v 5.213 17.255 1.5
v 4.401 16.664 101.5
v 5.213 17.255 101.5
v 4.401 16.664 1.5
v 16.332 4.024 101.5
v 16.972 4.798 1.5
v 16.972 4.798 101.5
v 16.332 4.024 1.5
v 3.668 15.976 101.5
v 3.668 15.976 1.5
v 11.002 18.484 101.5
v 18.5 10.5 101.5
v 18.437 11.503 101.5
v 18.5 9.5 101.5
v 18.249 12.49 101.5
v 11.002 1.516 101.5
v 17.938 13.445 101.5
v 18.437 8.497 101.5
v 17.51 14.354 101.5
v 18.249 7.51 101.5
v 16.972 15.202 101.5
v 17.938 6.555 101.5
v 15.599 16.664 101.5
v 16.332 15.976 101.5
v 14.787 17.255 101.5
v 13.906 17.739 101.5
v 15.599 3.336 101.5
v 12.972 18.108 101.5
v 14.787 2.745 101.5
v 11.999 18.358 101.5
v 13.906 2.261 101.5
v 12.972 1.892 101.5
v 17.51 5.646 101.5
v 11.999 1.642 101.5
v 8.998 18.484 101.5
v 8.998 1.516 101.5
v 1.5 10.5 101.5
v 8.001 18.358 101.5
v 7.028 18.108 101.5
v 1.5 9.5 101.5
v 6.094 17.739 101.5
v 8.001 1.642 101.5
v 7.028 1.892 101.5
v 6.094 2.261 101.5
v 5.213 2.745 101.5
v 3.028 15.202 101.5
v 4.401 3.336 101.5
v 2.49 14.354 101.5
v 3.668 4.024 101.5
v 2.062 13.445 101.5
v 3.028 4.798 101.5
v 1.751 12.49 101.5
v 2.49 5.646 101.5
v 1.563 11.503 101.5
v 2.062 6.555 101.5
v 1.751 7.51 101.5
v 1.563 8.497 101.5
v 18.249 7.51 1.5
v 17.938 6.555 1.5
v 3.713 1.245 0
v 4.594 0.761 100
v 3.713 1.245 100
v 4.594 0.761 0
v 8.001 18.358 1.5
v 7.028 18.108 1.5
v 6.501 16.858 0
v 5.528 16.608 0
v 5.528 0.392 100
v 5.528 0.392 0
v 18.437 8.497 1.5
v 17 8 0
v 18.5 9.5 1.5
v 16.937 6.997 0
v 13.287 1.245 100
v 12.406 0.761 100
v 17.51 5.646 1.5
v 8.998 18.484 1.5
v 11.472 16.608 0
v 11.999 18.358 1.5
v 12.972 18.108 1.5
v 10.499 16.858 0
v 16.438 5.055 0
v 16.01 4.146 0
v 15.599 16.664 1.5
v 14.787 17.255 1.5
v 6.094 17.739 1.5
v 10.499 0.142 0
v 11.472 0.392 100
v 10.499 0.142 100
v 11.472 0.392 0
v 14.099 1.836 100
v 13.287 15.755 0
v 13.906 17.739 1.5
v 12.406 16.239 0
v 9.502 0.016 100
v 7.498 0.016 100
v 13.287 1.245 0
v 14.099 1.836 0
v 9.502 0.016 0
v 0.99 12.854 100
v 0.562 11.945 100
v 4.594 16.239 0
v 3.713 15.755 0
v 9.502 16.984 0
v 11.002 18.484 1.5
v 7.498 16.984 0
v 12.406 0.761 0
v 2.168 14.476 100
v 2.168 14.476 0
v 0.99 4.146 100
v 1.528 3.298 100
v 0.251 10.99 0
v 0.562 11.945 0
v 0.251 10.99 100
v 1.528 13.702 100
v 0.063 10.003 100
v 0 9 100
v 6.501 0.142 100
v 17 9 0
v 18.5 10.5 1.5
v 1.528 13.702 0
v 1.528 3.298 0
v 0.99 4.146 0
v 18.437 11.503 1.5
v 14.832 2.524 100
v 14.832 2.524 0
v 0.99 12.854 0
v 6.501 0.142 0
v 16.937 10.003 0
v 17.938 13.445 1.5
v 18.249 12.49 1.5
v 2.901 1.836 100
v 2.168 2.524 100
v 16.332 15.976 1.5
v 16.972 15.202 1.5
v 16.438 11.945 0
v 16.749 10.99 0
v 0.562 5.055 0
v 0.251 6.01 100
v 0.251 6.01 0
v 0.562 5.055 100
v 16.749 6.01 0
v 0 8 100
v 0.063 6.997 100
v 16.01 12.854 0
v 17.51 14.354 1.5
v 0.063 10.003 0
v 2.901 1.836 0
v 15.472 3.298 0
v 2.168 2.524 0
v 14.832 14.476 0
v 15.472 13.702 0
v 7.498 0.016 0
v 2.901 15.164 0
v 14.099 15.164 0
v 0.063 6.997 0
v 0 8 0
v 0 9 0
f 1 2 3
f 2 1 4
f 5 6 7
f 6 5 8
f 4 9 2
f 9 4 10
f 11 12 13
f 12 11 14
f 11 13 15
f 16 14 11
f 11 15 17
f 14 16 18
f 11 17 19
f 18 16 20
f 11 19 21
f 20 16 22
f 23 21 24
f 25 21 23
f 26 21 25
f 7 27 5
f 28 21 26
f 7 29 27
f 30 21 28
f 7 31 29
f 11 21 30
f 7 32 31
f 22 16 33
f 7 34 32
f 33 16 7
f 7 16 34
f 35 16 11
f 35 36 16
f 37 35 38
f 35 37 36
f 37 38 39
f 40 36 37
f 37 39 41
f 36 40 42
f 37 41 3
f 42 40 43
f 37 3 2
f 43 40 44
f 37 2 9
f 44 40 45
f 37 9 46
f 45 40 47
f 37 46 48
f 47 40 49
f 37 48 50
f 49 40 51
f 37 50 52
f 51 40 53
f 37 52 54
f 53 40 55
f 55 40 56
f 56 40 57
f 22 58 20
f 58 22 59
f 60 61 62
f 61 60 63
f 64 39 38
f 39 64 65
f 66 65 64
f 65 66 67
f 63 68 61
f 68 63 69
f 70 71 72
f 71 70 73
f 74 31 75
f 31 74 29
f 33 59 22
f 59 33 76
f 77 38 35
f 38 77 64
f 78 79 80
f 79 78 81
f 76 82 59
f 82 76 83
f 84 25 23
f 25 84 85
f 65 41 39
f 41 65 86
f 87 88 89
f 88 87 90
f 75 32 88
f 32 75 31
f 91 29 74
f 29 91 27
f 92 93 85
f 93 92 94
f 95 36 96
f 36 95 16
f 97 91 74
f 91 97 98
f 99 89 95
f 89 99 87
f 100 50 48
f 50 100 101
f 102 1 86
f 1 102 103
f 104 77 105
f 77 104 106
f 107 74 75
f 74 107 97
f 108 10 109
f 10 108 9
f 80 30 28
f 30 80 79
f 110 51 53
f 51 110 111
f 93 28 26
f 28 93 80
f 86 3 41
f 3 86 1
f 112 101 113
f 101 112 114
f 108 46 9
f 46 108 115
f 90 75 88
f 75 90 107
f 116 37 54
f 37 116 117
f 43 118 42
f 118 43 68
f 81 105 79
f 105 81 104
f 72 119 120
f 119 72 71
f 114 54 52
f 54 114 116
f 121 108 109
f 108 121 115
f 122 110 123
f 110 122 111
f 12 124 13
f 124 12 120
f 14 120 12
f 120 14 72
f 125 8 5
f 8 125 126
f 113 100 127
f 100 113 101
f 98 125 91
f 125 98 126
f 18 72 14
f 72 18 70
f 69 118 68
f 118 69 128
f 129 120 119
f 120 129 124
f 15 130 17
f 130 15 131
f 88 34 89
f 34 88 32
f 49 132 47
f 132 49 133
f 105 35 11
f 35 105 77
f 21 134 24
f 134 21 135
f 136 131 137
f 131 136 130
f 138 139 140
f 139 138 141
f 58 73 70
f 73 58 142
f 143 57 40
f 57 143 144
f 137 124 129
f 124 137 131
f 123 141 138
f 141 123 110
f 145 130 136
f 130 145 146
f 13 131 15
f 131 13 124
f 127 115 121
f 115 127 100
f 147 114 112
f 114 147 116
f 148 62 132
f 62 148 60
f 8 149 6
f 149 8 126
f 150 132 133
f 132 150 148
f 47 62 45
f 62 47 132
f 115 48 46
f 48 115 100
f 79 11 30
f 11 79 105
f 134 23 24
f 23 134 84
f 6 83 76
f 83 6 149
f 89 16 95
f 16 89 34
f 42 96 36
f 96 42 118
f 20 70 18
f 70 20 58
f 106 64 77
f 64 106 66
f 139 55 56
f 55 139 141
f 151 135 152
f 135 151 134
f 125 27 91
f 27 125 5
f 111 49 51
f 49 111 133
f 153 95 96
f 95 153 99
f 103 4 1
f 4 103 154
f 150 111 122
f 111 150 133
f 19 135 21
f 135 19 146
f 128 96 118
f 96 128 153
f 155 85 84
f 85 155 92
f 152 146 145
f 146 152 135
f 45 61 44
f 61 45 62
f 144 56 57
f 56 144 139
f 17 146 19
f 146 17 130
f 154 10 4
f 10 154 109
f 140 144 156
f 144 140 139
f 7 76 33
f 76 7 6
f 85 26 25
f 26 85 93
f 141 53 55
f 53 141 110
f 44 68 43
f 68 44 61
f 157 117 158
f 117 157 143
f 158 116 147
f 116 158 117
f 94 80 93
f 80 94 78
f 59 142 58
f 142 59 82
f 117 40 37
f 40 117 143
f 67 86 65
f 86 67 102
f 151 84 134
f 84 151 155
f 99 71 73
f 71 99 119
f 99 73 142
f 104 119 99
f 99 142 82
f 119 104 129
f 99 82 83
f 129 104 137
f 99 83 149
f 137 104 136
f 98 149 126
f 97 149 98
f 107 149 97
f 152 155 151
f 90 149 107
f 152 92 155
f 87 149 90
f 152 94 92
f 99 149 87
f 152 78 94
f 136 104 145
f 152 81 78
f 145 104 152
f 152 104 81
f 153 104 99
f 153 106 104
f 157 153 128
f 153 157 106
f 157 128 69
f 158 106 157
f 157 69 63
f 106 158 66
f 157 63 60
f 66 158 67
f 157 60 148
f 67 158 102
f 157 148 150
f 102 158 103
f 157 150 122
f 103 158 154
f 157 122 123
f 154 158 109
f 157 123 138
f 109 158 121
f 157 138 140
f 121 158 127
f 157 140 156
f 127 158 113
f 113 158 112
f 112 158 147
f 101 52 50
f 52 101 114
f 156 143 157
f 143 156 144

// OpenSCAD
$fn = 128;

bugfix = $preview ? .1 : 0;

corners = 8;
height = 1.5;
shrink = height;
bottom_size = [100,110];
top_size = [bottom_size[0]-shrink*2,bottom_size[1]-shrink*2];
border = true;
border_width = 1;
border_height = 1;
holes = false;
hole_d = 5;
hole_h = height*2;
hole_dist = 10;

module rounded_square(size, radius) {
    translate([radius,radius]) {
        minkowski() {
            square([size[0] - 2*radius, size[1] - 2 * radius]);
            circle(r=radius, $fn=50);
        }
    }
}

module rounded_cube(size, radius, height) {
    linear_extrude(height) {
        rounded_square(size, radius);
    }
}

module border() {
    translate([shrink,shrink,height]) {
        difference() {
            rounded_cube(size=top_size, radius=corners, border_height);
            translate([border_width,border_width,0]) {
                rounded_cube(size=[top_size[0]-border_width*2,
                    top_size[1]-border_width*2],
                    radius=corners, border_height);
            }
        }
    }
}

module bunnplate() {
    hull() {
        rounded_cube(size=bottom_size,radius=corners, .1);
        translate([shrink,shrink,height]) {
            rounded_cube(size=top_size,radius=corners, .1);
        }
    }
    if (border) {
        border();
    }
}

difference() {
    bunnplate();
    if (holes) {
        translate([hole_dist,bottom_size[1]-hole_dist,-bugfix]) {
            cylinder(d=hole_d,h=hole_h+bugfix*2);
        }
        translate([bottom_size[0]-hole_dist,
            bottom_size[1]-hole_dist,-bugfix]) {
            cylinder(d=hole_d,h=hole_h+bugfix*2);
        }
    }
}
